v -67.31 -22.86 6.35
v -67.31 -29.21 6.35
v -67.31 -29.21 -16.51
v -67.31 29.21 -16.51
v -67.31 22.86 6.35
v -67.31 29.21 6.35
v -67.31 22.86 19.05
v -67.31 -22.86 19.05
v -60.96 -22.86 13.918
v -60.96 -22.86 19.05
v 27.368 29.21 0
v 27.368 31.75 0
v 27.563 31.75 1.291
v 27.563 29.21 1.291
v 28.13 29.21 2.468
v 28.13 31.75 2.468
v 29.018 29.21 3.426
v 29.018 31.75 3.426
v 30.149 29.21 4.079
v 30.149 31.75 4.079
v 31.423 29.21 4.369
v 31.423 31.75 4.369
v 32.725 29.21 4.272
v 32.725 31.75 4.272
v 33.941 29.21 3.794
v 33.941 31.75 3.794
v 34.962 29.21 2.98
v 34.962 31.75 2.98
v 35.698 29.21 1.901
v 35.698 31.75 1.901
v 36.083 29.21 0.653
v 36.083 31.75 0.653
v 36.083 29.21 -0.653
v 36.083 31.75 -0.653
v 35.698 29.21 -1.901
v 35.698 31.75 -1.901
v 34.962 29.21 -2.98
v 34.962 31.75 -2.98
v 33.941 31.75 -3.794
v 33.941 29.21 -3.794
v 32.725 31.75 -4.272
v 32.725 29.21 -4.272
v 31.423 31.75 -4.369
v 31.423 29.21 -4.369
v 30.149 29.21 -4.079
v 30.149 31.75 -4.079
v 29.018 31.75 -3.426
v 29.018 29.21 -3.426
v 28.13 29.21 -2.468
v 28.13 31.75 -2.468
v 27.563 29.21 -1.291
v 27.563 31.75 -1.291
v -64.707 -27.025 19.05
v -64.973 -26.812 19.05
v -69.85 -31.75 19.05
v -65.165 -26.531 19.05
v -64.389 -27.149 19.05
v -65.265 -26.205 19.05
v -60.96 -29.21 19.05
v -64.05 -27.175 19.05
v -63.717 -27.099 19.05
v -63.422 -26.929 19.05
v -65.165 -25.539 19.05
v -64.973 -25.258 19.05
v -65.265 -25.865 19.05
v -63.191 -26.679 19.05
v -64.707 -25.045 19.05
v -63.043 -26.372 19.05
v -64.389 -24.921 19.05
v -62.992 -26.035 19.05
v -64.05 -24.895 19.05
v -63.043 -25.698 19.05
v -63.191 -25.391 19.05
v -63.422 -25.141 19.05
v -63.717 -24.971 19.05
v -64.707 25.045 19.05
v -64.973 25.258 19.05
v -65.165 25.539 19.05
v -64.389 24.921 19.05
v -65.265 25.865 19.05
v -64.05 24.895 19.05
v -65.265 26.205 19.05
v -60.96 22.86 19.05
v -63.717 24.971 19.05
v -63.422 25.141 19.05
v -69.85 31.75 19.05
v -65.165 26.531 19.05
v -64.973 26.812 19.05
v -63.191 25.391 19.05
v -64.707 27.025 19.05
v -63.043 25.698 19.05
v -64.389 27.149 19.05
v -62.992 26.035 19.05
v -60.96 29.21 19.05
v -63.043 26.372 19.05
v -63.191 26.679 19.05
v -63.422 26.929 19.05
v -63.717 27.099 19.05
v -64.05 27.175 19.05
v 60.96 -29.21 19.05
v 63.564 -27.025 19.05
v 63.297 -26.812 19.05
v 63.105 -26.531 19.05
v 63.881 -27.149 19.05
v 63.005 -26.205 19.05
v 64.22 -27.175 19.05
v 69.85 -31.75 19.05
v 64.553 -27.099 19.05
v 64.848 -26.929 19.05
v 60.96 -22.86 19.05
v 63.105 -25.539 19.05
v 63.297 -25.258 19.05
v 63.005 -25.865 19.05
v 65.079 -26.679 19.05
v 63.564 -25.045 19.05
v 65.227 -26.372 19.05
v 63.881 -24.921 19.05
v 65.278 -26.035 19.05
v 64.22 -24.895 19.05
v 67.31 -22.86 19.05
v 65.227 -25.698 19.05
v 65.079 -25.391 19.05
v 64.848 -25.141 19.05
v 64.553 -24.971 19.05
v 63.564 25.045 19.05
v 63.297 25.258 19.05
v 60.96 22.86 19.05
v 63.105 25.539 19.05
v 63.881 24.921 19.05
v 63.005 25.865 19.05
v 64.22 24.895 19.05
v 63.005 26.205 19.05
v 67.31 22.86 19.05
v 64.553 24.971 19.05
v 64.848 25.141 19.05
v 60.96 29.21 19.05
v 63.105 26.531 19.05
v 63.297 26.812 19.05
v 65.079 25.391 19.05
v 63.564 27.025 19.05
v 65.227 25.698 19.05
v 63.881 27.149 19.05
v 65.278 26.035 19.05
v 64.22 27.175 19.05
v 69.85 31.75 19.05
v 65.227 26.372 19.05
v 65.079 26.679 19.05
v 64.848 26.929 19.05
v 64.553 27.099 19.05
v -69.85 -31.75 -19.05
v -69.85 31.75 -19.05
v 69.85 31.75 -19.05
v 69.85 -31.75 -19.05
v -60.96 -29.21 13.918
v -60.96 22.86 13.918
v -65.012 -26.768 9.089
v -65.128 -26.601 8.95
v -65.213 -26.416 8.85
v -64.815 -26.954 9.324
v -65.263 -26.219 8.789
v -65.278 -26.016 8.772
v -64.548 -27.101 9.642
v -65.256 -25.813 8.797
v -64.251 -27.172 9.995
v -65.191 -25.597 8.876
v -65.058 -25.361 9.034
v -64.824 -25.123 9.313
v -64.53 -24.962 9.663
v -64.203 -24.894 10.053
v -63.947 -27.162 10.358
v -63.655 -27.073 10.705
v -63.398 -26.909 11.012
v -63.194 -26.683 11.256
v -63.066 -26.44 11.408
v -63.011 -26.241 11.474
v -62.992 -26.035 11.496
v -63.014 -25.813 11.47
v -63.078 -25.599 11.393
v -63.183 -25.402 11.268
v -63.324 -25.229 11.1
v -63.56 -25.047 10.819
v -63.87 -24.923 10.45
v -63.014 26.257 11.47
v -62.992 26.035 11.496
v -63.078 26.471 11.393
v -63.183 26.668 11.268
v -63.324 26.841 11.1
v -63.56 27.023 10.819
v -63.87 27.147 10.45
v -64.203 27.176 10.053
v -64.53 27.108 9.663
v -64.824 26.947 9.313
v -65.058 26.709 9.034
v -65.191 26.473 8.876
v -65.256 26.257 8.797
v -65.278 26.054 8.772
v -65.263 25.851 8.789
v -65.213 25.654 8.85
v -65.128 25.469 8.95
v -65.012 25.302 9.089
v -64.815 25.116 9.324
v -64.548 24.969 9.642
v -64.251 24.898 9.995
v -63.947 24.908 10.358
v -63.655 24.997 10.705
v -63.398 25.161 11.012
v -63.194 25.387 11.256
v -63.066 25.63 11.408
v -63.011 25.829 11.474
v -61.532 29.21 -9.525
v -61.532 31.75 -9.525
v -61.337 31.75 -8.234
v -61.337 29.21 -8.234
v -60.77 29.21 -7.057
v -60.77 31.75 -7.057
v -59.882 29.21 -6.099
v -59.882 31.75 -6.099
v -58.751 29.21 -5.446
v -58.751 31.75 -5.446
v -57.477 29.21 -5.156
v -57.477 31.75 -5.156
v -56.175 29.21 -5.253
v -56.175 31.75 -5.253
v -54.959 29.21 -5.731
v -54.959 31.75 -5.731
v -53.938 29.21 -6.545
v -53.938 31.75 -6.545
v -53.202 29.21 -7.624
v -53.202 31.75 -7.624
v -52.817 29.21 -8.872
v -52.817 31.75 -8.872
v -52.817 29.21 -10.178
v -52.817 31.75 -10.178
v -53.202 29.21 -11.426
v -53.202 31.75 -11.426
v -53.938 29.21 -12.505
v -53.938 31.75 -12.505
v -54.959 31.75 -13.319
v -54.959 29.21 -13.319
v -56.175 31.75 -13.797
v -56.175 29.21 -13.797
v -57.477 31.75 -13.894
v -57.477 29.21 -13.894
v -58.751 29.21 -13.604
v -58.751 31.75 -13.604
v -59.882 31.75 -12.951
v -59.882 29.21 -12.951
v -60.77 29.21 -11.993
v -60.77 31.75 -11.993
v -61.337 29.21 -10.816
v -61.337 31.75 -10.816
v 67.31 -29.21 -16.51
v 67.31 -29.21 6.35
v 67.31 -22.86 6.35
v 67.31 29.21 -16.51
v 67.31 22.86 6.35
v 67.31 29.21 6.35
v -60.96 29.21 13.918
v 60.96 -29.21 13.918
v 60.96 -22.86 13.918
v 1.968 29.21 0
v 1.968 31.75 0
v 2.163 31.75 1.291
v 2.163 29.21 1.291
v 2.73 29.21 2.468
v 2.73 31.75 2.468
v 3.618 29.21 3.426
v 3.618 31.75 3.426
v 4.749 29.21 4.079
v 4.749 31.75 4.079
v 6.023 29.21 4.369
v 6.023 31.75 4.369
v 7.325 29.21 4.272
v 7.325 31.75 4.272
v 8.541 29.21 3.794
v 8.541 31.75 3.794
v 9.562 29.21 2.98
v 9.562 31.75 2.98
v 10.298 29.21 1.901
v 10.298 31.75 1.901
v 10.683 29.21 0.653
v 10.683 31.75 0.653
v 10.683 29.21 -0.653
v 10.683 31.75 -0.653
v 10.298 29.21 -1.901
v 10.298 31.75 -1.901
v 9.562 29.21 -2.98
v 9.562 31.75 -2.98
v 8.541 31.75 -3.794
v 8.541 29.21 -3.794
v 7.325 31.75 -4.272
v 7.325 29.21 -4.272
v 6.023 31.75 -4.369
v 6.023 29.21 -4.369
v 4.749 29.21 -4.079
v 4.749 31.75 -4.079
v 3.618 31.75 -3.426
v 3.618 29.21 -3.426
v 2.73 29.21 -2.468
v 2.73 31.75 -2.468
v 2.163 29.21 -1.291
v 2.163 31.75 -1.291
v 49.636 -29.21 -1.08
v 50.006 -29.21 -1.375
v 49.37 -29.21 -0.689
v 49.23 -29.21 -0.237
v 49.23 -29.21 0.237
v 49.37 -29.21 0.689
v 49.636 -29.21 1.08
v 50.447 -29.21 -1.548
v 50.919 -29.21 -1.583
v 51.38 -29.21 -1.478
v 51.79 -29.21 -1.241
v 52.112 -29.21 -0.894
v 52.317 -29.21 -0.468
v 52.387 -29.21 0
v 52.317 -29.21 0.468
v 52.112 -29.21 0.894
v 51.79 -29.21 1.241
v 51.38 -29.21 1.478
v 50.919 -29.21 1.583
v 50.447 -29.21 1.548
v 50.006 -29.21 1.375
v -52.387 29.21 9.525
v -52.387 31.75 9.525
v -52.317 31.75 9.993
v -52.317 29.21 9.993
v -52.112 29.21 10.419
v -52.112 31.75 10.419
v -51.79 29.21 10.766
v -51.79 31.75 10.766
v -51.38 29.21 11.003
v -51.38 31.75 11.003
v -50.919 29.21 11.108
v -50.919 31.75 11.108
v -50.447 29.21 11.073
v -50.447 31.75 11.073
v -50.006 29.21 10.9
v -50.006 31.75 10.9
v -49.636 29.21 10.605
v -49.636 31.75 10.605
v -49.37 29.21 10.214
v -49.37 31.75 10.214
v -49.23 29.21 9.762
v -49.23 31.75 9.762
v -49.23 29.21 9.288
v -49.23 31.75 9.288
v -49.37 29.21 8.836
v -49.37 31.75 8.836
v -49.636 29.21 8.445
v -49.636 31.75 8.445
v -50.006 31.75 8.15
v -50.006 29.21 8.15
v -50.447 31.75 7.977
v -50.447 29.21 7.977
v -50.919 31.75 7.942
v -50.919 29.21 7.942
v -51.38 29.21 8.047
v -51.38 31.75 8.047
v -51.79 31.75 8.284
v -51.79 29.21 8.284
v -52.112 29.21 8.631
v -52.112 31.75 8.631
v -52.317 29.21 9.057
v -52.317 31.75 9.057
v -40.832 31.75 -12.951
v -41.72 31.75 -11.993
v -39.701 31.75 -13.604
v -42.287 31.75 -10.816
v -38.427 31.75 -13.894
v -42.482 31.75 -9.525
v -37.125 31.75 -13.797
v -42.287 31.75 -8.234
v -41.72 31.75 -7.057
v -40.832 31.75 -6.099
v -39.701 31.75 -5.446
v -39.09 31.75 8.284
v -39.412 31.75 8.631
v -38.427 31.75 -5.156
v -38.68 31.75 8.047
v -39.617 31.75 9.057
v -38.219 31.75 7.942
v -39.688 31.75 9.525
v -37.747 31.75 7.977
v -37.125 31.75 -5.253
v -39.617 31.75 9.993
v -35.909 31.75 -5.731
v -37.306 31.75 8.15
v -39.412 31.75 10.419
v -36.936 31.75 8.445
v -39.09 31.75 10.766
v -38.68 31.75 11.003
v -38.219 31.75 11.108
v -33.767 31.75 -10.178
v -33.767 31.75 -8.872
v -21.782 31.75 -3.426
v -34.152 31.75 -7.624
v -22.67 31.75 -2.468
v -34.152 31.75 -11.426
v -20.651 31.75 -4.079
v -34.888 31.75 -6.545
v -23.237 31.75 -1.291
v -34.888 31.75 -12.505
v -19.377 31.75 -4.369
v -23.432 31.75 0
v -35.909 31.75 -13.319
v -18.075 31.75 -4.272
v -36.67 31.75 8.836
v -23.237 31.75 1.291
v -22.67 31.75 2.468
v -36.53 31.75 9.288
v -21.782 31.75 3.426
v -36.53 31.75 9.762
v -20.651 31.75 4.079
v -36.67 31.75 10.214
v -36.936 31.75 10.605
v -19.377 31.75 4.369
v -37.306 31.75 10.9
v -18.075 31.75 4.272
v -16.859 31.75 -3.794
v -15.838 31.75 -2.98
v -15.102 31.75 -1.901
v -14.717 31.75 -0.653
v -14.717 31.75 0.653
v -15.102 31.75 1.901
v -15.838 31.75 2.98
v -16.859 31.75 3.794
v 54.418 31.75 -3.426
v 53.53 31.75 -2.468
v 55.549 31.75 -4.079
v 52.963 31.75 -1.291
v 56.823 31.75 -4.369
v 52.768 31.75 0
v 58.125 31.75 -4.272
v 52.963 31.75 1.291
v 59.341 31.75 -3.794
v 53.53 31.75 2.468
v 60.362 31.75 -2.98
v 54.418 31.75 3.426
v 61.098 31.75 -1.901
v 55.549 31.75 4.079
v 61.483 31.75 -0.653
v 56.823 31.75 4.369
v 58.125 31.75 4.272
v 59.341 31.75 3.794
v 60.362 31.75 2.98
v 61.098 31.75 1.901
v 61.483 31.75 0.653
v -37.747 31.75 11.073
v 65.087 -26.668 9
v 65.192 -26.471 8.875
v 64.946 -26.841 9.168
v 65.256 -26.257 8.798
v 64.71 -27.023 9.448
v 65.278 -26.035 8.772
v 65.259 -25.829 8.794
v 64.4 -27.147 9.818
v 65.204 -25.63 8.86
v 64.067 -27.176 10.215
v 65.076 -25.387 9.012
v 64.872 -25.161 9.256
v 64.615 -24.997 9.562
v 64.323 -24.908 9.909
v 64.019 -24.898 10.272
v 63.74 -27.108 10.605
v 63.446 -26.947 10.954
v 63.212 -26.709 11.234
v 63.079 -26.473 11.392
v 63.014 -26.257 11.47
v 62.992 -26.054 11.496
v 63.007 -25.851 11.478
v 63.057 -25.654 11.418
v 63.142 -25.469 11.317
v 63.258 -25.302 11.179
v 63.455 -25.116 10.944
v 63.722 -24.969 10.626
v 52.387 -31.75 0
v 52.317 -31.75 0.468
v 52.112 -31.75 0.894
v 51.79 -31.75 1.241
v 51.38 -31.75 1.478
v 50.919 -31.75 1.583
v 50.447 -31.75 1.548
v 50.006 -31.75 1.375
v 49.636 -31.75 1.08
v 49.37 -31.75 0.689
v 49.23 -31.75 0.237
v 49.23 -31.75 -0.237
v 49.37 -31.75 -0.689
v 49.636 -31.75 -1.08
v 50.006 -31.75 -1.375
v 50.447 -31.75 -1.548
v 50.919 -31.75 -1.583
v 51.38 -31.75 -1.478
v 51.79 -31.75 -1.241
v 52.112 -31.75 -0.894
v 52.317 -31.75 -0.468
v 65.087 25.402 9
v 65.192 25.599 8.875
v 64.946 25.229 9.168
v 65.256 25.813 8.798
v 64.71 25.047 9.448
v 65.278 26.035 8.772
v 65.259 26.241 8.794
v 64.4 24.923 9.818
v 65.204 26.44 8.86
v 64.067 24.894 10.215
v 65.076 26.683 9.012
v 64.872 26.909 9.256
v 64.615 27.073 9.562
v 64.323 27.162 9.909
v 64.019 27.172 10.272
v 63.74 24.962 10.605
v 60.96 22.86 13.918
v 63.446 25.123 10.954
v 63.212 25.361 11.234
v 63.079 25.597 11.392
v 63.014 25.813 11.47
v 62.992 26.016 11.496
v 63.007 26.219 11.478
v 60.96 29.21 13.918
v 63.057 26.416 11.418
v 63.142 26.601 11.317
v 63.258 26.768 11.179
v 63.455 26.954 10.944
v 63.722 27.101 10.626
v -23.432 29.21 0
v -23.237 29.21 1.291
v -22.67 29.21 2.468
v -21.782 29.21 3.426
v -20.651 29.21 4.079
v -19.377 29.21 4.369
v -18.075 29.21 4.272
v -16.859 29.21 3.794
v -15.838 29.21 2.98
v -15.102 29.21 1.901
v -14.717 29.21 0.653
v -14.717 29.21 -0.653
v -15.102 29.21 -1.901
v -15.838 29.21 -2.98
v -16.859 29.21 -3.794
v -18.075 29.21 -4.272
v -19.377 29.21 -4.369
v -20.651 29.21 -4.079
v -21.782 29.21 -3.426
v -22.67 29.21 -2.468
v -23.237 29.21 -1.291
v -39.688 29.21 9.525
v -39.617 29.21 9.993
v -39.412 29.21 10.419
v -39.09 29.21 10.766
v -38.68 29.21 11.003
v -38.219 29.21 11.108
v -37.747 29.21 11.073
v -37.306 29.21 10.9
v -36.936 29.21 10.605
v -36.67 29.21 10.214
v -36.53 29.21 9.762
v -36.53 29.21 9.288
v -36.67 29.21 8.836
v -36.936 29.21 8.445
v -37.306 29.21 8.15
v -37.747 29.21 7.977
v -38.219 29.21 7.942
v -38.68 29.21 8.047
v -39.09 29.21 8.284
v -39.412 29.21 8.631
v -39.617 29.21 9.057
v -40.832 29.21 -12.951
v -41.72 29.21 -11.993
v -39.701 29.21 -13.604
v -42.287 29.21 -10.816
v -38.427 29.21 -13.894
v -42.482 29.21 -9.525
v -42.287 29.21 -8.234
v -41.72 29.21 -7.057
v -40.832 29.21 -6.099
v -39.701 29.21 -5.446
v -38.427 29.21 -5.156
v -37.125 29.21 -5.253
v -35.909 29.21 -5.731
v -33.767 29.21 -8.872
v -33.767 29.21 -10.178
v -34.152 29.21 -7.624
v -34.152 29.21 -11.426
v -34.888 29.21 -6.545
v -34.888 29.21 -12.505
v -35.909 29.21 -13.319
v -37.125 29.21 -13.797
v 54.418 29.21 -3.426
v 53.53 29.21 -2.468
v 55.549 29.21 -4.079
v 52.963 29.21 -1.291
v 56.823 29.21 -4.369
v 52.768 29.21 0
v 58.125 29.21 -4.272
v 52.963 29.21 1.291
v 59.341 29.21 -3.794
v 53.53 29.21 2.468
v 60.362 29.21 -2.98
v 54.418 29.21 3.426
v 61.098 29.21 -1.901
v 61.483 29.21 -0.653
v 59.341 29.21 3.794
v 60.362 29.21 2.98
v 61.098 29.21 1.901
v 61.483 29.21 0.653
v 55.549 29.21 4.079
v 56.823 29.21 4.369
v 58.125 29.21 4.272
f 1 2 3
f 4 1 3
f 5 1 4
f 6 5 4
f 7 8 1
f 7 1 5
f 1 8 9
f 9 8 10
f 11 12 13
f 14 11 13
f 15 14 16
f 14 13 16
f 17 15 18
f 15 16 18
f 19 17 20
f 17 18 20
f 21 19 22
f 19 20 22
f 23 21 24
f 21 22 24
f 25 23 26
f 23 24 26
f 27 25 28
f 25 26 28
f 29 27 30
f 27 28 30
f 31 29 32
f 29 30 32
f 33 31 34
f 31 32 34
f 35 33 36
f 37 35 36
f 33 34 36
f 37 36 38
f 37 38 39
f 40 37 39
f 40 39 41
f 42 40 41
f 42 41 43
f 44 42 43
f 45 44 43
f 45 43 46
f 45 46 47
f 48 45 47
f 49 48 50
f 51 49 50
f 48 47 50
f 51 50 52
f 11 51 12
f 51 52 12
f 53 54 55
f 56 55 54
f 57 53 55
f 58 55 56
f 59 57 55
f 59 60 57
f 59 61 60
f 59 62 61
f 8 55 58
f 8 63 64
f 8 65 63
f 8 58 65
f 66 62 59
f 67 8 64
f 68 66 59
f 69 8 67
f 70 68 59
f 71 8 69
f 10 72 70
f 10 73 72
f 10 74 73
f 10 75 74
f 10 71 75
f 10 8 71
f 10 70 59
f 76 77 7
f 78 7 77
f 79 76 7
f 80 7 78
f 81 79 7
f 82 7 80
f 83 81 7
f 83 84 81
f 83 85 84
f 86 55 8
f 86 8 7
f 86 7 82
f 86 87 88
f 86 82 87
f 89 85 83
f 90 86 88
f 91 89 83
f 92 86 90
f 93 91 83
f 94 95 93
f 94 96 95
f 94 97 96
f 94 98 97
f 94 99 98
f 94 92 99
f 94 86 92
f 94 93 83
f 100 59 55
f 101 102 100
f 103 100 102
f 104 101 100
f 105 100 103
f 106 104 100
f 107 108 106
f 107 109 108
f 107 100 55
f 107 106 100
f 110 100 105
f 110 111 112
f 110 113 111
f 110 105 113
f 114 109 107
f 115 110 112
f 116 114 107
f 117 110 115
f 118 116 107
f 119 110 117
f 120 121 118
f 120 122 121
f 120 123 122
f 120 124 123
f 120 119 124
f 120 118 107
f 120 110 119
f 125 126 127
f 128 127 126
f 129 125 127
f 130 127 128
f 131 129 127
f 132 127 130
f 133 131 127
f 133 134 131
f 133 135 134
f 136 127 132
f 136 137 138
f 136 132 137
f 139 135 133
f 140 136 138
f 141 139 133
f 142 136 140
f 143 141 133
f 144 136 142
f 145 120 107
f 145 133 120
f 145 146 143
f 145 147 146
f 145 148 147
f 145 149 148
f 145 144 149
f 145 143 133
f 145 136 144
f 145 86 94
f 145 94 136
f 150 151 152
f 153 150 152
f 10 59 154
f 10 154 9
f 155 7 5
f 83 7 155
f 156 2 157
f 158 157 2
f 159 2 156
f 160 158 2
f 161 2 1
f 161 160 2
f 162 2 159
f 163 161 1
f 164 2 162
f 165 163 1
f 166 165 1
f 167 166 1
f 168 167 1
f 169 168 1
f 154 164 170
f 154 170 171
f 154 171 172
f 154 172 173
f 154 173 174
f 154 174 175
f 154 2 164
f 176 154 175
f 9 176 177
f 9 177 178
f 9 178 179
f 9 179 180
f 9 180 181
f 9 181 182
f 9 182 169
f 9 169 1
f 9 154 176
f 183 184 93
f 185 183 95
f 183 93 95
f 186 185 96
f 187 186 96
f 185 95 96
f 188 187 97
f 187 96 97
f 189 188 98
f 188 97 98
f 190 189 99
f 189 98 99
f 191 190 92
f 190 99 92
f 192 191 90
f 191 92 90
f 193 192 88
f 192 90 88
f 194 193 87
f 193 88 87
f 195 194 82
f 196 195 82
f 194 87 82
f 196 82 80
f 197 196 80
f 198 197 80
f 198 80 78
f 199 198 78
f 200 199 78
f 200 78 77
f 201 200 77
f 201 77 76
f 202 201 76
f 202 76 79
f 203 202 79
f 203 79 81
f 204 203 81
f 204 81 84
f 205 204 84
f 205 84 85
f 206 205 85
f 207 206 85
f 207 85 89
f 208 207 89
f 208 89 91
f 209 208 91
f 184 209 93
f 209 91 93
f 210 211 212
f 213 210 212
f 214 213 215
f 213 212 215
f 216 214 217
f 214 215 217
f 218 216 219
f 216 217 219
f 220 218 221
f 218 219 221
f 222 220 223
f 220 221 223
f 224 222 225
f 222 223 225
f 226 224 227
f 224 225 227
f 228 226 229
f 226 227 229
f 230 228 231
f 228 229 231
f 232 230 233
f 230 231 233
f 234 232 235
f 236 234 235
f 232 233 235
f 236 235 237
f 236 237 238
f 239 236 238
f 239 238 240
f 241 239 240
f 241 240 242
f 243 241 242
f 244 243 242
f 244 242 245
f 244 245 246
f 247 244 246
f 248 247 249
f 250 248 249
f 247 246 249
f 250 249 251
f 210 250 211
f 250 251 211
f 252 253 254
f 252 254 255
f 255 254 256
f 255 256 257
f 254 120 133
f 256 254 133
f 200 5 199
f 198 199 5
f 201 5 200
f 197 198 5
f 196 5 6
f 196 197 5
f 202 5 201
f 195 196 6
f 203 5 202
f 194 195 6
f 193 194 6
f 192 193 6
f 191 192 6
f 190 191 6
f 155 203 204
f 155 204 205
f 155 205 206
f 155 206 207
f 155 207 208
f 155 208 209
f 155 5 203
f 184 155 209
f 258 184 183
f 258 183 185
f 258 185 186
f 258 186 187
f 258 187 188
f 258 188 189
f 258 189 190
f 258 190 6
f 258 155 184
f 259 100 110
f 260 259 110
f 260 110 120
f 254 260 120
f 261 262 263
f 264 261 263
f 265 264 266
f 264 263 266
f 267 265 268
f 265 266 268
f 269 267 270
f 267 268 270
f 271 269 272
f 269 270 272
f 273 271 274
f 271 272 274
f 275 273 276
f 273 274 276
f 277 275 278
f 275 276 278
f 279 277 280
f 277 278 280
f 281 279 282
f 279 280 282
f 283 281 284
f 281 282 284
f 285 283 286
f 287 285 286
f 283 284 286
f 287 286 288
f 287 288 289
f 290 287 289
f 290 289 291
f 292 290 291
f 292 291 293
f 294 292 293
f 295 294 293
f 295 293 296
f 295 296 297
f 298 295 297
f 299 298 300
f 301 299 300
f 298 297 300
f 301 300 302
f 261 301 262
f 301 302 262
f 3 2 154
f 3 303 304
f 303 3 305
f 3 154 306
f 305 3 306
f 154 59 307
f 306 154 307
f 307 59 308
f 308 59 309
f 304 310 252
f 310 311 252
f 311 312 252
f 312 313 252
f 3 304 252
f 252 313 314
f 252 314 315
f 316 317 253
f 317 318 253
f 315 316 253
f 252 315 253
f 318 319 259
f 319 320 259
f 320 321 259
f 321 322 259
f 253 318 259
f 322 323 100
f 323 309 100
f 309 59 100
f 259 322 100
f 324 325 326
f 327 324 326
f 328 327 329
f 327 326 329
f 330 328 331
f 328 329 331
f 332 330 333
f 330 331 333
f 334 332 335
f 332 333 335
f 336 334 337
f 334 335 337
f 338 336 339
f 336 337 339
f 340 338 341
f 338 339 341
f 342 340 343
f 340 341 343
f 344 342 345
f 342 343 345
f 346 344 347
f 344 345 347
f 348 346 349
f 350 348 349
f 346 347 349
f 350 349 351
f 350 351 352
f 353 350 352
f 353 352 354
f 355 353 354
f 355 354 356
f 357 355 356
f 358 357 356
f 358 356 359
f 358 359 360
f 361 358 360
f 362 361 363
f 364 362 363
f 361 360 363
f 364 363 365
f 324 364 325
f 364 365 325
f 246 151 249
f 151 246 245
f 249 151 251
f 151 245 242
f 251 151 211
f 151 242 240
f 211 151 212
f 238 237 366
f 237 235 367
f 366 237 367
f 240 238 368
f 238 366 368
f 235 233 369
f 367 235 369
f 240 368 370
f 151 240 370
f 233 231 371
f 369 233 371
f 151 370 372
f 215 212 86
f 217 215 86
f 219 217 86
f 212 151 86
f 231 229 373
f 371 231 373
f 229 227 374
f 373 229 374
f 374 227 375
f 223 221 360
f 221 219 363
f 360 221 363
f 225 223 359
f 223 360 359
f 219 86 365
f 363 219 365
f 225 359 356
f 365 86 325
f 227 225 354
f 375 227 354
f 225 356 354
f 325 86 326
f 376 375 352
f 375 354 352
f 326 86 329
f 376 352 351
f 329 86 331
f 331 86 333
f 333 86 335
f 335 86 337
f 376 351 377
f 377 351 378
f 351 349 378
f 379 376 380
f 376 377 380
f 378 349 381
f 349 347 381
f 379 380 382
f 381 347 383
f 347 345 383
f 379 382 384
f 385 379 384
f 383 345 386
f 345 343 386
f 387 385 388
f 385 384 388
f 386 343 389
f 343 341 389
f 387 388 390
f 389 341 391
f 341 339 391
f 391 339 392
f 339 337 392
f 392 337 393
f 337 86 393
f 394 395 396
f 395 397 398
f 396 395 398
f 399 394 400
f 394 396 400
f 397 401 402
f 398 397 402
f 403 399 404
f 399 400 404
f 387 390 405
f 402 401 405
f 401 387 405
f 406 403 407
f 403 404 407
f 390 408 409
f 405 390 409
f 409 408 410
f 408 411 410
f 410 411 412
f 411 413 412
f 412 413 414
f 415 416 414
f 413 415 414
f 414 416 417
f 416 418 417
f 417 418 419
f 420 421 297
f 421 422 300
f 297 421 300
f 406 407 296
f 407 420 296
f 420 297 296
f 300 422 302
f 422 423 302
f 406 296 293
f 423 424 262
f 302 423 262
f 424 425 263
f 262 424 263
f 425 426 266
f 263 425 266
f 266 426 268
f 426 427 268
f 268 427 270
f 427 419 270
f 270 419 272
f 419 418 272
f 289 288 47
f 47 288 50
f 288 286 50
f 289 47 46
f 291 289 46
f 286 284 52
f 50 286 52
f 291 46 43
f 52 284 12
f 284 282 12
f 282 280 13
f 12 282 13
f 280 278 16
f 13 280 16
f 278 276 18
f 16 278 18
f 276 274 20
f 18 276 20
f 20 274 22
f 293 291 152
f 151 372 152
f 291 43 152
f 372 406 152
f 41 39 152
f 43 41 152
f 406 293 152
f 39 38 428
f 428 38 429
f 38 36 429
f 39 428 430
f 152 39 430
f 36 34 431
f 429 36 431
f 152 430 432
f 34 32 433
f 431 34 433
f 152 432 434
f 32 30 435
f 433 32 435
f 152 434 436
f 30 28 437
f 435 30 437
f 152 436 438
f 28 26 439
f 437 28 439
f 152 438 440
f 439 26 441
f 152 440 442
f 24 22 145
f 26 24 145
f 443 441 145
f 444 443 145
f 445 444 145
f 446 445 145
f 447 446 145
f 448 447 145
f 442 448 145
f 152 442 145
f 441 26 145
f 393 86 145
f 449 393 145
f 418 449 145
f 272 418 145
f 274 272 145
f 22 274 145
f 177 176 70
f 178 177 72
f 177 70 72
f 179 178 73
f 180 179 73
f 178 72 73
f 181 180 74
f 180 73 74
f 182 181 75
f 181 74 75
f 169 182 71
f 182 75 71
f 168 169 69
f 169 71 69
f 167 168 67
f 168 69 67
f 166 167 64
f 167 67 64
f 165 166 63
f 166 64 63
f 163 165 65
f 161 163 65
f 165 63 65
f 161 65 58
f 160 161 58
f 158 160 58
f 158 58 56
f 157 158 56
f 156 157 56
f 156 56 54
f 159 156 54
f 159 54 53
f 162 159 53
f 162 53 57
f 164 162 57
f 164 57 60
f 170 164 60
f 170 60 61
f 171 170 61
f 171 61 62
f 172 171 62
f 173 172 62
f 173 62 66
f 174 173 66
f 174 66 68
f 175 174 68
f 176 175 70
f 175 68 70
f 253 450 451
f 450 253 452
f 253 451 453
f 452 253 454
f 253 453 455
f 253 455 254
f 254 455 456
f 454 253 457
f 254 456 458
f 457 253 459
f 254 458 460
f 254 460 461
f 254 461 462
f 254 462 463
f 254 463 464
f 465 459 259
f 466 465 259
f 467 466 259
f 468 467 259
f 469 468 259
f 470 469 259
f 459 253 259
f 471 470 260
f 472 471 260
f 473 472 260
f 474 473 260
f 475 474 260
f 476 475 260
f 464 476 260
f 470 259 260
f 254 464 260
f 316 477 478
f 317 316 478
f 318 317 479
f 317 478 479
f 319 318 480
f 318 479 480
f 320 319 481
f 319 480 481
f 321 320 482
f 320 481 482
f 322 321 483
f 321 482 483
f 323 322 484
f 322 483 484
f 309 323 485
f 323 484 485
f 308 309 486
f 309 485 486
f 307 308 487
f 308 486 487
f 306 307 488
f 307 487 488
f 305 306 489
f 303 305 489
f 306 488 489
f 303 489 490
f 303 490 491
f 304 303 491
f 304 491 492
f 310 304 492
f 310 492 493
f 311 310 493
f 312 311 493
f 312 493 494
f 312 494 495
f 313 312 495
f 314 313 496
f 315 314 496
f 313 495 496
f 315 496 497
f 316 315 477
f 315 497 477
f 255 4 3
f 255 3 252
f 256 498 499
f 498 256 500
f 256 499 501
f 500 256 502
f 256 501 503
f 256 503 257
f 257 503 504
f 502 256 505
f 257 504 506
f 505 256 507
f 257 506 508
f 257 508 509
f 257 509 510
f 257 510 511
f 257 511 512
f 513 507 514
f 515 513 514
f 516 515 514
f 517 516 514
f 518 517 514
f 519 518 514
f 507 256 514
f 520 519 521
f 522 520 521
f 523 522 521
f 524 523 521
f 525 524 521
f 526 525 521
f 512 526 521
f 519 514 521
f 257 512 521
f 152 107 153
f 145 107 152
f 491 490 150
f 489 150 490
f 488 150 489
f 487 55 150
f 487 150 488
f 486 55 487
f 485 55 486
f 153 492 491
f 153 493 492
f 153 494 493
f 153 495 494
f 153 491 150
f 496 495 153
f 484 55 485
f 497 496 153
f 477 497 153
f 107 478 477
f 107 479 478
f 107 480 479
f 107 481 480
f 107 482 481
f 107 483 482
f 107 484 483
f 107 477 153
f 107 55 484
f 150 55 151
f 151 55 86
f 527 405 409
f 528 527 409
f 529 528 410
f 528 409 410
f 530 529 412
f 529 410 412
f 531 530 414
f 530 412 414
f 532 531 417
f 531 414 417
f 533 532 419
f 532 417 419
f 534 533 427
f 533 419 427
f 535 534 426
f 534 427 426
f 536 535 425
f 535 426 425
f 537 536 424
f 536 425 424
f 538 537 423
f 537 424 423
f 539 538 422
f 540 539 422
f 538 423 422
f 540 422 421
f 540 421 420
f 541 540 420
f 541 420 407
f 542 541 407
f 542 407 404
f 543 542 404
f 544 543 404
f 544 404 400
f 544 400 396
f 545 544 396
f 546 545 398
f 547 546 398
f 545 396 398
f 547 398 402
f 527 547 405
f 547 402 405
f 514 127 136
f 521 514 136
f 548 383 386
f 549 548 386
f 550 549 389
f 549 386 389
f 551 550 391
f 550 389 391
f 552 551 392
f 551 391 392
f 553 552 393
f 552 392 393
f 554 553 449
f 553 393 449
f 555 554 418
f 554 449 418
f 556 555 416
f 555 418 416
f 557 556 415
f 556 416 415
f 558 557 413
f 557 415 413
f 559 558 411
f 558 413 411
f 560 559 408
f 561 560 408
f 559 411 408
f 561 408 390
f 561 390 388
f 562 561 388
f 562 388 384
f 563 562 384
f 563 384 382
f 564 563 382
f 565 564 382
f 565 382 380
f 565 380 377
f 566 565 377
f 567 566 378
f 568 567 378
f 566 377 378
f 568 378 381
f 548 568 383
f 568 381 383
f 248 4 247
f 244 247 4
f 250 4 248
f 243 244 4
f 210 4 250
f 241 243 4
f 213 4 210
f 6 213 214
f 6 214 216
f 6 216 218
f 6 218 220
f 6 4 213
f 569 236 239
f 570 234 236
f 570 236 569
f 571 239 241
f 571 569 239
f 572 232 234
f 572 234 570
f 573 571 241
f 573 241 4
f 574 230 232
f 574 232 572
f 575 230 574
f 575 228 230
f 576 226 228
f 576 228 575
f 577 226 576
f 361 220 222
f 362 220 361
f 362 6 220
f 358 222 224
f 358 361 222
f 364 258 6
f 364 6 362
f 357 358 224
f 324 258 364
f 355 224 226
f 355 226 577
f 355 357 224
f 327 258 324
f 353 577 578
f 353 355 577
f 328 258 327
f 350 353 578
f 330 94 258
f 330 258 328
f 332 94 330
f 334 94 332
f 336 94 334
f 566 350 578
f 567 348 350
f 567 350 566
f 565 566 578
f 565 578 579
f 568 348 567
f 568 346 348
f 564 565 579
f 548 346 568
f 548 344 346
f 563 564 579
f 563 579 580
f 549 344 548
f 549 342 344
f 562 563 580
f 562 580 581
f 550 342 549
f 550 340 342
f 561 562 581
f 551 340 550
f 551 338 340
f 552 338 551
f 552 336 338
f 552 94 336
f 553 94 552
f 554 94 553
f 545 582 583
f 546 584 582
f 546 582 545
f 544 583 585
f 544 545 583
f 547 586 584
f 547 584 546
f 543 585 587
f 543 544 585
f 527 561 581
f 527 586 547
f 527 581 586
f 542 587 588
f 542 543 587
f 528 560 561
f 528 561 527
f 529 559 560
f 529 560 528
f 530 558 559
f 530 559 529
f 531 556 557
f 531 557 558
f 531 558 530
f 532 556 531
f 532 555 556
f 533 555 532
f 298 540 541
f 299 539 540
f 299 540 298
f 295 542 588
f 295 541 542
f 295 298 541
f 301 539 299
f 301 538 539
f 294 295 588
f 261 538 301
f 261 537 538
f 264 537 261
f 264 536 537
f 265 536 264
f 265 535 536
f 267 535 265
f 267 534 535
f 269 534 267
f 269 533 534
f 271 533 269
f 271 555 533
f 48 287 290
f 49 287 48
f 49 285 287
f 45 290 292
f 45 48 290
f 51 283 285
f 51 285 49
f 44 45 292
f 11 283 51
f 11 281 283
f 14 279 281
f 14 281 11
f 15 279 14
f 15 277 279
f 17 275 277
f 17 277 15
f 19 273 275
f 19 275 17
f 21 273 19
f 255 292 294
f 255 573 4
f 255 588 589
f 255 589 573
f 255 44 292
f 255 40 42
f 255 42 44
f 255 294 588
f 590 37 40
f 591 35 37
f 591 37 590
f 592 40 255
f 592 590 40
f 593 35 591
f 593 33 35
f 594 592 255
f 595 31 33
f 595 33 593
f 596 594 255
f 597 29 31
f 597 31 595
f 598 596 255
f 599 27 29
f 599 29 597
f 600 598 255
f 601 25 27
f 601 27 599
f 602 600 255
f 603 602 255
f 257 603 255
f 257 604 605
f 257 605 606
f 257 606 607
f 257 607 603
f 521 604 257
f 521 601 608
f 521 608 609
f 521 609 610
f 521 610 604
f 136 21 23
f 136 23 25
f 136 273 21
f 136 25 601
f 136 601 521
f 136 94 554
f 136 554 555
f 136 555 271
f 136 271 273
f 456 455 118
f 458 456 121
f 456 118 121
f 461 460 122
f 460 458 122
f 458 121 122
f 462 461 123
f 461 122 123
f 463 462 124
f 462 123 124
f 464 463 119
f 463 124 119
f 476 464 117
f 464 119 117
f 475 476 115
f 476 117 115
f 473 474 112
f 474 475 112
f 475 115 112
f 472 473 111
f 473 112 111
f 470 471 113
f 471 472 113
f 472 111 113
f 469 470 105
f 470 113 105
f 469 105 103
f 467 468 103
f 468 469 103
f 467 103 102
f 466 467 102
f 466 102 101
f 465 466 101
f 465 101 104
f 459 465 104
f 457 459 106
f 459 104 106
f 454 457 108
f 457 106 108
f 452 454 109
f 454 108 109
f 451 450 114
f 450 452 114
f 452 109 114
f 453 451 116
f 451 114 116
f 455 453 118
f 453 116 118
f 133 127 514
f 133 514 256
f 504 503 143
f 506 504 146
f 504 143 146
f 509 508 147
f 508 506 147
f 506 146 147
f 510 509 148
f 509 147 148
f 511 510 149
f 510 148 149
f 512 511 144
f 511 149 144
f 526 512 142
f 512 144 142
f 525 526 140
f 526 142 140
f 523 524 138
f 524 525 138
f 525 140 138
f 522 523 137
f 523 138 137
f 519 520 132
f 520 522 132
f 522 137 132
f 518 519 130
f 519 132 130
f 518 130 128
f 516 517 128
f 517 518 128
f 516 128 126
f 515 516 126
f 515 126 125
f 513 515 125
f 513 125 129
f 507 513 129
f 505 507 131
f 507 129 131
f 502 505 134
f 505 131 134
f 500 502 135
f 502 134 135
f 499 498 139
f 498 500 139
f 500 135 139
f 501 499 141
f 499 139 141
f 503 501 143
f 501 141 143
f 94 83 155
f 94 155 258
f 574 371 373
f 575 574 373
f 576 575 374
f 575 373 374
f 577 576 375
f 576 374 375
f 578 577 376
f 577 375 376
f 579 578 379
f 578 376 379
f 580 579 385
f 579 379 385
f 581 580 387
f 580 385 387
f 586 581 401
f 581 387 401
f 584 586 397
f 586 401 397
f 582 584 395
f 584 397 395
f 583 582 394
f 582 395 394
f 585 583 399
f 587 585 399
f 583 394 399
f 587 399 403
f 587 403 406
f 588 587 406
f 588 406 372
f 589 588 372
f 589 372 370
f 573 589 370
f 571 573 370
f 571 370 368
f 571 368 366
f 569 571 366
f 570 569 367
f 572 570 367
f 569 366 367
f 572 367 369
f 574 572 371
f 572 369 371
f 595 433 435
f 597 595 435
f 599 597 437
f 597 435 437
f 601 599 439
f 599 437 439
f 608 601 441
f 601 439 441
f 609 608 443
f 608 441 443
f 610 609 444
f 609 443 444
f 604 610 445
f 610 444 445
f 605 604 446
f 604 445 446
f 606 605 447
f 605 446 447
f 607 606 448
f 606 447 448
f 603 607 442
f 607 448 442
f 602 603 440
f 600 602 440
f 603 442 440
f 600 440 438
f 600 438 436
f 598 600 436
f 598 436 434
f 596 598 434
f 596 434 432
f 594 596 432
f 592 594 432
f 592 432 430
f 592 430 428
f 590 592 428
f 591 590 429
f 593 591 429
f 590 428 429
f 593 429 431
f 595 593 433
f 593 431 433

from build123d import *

# Parameters (mm, degrees)
F0_W        = 139.7
F0_H        = 63.5
F1_DEPTH    = 19.05
F2_W        = 134.62
F2_H        = 58.42
F3_DEPTH    = 35.56
F4_R        = 1.5875
F5_DEPTH    = 2.54
F6_R        = 4.3815
F6_R_2      = 1.5875
F7_DEPTH    = 2.54
F8_W        = 6.35
F8_H        = 6.35
F9_DEPTH    = 12.7
F10_SIZE2   = 7.567625
F10_SIZE    = 6.34999
F10_2_SIZE2 = 7.567625
F10_2_SIZE  = 6.34999
F11_SIZE2   = 7.567625
F11_SIZE    = 6.34999
F11_2_SIZE2 = 7.567625
F11_2_SIZE  = 6.34999
F12_R       = 1.143
F13_DEPTH   = 12.7


# Not quite as in the source:
# - a fillet or chamfer is up to 0.001 mm smaller than in the source, because OpenCascade refuses the exact size


with BuildPart() as f1:
    # F0 (on Top) → F1 (new body, symmetric)
    with BuildSketch(Plane.XY):
        Rectangle(F0_W, F0_H)
    extrude(amount=F1_DEPTH, both=True)

    # F2 (on face) → F3 (cut)
    with BuildSketch(Plane.XY.offset(19.05)):
        Rectangle(F2_W, F2_H)
    extrude(amount=-F3_DEPTH, mode=Mode.SUBTRACT)

    # F4 (on face) → F5 (cut, through all)
    with BuildSketch(Plane.XZ.offset(31.75)):
        with Locations((50.8, 0)):
            Circle(F4_R)
    extrude(amount=-F5_DEPTH, mode=Mode.SUBTRACT)

    # F6 (on face) → F7 (cut, through all)
    with BuildSketch(Plane(origin=(0, 31.75, 0), x_dir=(-1, 0, 0), z_dir=(0, 1, 0))):
        with Locations((-31.75, 0)):
            Circle(F6_R)
        with Locations((-6.35, 0)):
            Circle(F6_R)
        with Locations((19.05, 0)):
            Circle(F6_R)
        with Locations((50.8, 9.525)):
            Circle(F6_R_2)
        with Locations((38.1, 9.525)):
            Circle(F6_R_2)
        with Locations((57.15, -9.525)):
            Circle(F6_R)
        with Locations((38.1, -9.525)):
            Circle(F6_R)
        with Locations((-57.15, 0)):
            Circle(F6_R)
    extrude(amount=-F7_DEPTH, mode=Mode.SUBTRACT)

    # F8 (on face) → F9 (join)
    with BuildSketch(Plane.XY.offset(19.05)):
        with Locations((-64.135, -26.035)):
            Rectangle(F8_W, F8_H)
        with Locations((64.135, 26.035)):
            Rectangle(F8_W, F8_H)
        with Locations((64.135, -26.035)):
            Rectangle(F8_W, F8_H)
        with Locations((-64.135, 26.035)):
            Rectangle(F8_W, F8_H)
    extrude(amount=-F9_DEPTH)

    # F10 (size 6.35 and 7.567635313 in the source; OpenCascade refuses exactly that, so slightly less here)
    f10_edges = [f1.edges().sort_by_distance(p)[0] for p in [
        (-60.96, 26.035, 6.35),
    ]]
    f10_side = f1.faces().sort_by_distance((-64.135, 26.035, 6.35))[0]
    chamfer(f10_edges, length=F10_SIZE, length2=F10_SIZE2, reference=f10_side)

    # F10#2 (size 6.35 and 7.567635313 in the source; OpenCascade refuses exactly that, so slightly less here)
    f10_2_edges = [f1.edges().sort_by_distance(p)[0] for p in [
        (60.96, -26.035, 6.35),
    ]]
    f10_2_side = f1.faces().sort_by_distance((64.135, -26.035, 6.35))[0]
    chamfer(f10_2_edges, length=F10_2_SIZE, length2=F10_2_SIZE2, reference=f10_2_side)

    # F11 (size 6.35 and 7.567635313 in the source; OpenCascade refuses exactly that, so slightly less here)
    f11_edges = [f1.edges().sort_by_distance(p)[0] for p in [
        (60.96, 26.035, 6.35),
    ]]
    f11_side = f1.faces().sort_by_distance((64.135, 26.035, 6.35))[0]
    chamfer(f11_edges, length=F11_SIZE, length2=F11_SIZE2, reference=f11_side)

    # F11#2 (size 6.35 and 7.567635313 in the source; OpenCascade refuses exactly that, so slightly less here)
    f11_2_edges = [f1.edges().sort_by_distance(p)[0] for p in [
        (-60.96, -26.035, 6.35),
    ]]
    f11_2_side = f1.faces().sort_by_distance((-64.135, -26.035, 6.35))[0]
    chamfer(f11_2_edges, length=F11_2_SIZE, length2=F11_2_SIZE2, reference=f11_2_side)

    # F12 (on face) → F13 (cut)
    with BuildSketch(Plane.XY.offset(19.05)):
        with Locations((-64.135, 26.035)):
            Circle(F12_R)
        with Locations((64.135, 26.035)):
            Circle(F12_R)
        with Locations((-64.135, -26.035)):
            Circle(F12_R)
        with Locations((64.135, -26.035)):
            Circle(F12_R)
    extrude(amount=-F13_DEPTH, mode=Mode.SUBTRACT)


solid = f1.part
